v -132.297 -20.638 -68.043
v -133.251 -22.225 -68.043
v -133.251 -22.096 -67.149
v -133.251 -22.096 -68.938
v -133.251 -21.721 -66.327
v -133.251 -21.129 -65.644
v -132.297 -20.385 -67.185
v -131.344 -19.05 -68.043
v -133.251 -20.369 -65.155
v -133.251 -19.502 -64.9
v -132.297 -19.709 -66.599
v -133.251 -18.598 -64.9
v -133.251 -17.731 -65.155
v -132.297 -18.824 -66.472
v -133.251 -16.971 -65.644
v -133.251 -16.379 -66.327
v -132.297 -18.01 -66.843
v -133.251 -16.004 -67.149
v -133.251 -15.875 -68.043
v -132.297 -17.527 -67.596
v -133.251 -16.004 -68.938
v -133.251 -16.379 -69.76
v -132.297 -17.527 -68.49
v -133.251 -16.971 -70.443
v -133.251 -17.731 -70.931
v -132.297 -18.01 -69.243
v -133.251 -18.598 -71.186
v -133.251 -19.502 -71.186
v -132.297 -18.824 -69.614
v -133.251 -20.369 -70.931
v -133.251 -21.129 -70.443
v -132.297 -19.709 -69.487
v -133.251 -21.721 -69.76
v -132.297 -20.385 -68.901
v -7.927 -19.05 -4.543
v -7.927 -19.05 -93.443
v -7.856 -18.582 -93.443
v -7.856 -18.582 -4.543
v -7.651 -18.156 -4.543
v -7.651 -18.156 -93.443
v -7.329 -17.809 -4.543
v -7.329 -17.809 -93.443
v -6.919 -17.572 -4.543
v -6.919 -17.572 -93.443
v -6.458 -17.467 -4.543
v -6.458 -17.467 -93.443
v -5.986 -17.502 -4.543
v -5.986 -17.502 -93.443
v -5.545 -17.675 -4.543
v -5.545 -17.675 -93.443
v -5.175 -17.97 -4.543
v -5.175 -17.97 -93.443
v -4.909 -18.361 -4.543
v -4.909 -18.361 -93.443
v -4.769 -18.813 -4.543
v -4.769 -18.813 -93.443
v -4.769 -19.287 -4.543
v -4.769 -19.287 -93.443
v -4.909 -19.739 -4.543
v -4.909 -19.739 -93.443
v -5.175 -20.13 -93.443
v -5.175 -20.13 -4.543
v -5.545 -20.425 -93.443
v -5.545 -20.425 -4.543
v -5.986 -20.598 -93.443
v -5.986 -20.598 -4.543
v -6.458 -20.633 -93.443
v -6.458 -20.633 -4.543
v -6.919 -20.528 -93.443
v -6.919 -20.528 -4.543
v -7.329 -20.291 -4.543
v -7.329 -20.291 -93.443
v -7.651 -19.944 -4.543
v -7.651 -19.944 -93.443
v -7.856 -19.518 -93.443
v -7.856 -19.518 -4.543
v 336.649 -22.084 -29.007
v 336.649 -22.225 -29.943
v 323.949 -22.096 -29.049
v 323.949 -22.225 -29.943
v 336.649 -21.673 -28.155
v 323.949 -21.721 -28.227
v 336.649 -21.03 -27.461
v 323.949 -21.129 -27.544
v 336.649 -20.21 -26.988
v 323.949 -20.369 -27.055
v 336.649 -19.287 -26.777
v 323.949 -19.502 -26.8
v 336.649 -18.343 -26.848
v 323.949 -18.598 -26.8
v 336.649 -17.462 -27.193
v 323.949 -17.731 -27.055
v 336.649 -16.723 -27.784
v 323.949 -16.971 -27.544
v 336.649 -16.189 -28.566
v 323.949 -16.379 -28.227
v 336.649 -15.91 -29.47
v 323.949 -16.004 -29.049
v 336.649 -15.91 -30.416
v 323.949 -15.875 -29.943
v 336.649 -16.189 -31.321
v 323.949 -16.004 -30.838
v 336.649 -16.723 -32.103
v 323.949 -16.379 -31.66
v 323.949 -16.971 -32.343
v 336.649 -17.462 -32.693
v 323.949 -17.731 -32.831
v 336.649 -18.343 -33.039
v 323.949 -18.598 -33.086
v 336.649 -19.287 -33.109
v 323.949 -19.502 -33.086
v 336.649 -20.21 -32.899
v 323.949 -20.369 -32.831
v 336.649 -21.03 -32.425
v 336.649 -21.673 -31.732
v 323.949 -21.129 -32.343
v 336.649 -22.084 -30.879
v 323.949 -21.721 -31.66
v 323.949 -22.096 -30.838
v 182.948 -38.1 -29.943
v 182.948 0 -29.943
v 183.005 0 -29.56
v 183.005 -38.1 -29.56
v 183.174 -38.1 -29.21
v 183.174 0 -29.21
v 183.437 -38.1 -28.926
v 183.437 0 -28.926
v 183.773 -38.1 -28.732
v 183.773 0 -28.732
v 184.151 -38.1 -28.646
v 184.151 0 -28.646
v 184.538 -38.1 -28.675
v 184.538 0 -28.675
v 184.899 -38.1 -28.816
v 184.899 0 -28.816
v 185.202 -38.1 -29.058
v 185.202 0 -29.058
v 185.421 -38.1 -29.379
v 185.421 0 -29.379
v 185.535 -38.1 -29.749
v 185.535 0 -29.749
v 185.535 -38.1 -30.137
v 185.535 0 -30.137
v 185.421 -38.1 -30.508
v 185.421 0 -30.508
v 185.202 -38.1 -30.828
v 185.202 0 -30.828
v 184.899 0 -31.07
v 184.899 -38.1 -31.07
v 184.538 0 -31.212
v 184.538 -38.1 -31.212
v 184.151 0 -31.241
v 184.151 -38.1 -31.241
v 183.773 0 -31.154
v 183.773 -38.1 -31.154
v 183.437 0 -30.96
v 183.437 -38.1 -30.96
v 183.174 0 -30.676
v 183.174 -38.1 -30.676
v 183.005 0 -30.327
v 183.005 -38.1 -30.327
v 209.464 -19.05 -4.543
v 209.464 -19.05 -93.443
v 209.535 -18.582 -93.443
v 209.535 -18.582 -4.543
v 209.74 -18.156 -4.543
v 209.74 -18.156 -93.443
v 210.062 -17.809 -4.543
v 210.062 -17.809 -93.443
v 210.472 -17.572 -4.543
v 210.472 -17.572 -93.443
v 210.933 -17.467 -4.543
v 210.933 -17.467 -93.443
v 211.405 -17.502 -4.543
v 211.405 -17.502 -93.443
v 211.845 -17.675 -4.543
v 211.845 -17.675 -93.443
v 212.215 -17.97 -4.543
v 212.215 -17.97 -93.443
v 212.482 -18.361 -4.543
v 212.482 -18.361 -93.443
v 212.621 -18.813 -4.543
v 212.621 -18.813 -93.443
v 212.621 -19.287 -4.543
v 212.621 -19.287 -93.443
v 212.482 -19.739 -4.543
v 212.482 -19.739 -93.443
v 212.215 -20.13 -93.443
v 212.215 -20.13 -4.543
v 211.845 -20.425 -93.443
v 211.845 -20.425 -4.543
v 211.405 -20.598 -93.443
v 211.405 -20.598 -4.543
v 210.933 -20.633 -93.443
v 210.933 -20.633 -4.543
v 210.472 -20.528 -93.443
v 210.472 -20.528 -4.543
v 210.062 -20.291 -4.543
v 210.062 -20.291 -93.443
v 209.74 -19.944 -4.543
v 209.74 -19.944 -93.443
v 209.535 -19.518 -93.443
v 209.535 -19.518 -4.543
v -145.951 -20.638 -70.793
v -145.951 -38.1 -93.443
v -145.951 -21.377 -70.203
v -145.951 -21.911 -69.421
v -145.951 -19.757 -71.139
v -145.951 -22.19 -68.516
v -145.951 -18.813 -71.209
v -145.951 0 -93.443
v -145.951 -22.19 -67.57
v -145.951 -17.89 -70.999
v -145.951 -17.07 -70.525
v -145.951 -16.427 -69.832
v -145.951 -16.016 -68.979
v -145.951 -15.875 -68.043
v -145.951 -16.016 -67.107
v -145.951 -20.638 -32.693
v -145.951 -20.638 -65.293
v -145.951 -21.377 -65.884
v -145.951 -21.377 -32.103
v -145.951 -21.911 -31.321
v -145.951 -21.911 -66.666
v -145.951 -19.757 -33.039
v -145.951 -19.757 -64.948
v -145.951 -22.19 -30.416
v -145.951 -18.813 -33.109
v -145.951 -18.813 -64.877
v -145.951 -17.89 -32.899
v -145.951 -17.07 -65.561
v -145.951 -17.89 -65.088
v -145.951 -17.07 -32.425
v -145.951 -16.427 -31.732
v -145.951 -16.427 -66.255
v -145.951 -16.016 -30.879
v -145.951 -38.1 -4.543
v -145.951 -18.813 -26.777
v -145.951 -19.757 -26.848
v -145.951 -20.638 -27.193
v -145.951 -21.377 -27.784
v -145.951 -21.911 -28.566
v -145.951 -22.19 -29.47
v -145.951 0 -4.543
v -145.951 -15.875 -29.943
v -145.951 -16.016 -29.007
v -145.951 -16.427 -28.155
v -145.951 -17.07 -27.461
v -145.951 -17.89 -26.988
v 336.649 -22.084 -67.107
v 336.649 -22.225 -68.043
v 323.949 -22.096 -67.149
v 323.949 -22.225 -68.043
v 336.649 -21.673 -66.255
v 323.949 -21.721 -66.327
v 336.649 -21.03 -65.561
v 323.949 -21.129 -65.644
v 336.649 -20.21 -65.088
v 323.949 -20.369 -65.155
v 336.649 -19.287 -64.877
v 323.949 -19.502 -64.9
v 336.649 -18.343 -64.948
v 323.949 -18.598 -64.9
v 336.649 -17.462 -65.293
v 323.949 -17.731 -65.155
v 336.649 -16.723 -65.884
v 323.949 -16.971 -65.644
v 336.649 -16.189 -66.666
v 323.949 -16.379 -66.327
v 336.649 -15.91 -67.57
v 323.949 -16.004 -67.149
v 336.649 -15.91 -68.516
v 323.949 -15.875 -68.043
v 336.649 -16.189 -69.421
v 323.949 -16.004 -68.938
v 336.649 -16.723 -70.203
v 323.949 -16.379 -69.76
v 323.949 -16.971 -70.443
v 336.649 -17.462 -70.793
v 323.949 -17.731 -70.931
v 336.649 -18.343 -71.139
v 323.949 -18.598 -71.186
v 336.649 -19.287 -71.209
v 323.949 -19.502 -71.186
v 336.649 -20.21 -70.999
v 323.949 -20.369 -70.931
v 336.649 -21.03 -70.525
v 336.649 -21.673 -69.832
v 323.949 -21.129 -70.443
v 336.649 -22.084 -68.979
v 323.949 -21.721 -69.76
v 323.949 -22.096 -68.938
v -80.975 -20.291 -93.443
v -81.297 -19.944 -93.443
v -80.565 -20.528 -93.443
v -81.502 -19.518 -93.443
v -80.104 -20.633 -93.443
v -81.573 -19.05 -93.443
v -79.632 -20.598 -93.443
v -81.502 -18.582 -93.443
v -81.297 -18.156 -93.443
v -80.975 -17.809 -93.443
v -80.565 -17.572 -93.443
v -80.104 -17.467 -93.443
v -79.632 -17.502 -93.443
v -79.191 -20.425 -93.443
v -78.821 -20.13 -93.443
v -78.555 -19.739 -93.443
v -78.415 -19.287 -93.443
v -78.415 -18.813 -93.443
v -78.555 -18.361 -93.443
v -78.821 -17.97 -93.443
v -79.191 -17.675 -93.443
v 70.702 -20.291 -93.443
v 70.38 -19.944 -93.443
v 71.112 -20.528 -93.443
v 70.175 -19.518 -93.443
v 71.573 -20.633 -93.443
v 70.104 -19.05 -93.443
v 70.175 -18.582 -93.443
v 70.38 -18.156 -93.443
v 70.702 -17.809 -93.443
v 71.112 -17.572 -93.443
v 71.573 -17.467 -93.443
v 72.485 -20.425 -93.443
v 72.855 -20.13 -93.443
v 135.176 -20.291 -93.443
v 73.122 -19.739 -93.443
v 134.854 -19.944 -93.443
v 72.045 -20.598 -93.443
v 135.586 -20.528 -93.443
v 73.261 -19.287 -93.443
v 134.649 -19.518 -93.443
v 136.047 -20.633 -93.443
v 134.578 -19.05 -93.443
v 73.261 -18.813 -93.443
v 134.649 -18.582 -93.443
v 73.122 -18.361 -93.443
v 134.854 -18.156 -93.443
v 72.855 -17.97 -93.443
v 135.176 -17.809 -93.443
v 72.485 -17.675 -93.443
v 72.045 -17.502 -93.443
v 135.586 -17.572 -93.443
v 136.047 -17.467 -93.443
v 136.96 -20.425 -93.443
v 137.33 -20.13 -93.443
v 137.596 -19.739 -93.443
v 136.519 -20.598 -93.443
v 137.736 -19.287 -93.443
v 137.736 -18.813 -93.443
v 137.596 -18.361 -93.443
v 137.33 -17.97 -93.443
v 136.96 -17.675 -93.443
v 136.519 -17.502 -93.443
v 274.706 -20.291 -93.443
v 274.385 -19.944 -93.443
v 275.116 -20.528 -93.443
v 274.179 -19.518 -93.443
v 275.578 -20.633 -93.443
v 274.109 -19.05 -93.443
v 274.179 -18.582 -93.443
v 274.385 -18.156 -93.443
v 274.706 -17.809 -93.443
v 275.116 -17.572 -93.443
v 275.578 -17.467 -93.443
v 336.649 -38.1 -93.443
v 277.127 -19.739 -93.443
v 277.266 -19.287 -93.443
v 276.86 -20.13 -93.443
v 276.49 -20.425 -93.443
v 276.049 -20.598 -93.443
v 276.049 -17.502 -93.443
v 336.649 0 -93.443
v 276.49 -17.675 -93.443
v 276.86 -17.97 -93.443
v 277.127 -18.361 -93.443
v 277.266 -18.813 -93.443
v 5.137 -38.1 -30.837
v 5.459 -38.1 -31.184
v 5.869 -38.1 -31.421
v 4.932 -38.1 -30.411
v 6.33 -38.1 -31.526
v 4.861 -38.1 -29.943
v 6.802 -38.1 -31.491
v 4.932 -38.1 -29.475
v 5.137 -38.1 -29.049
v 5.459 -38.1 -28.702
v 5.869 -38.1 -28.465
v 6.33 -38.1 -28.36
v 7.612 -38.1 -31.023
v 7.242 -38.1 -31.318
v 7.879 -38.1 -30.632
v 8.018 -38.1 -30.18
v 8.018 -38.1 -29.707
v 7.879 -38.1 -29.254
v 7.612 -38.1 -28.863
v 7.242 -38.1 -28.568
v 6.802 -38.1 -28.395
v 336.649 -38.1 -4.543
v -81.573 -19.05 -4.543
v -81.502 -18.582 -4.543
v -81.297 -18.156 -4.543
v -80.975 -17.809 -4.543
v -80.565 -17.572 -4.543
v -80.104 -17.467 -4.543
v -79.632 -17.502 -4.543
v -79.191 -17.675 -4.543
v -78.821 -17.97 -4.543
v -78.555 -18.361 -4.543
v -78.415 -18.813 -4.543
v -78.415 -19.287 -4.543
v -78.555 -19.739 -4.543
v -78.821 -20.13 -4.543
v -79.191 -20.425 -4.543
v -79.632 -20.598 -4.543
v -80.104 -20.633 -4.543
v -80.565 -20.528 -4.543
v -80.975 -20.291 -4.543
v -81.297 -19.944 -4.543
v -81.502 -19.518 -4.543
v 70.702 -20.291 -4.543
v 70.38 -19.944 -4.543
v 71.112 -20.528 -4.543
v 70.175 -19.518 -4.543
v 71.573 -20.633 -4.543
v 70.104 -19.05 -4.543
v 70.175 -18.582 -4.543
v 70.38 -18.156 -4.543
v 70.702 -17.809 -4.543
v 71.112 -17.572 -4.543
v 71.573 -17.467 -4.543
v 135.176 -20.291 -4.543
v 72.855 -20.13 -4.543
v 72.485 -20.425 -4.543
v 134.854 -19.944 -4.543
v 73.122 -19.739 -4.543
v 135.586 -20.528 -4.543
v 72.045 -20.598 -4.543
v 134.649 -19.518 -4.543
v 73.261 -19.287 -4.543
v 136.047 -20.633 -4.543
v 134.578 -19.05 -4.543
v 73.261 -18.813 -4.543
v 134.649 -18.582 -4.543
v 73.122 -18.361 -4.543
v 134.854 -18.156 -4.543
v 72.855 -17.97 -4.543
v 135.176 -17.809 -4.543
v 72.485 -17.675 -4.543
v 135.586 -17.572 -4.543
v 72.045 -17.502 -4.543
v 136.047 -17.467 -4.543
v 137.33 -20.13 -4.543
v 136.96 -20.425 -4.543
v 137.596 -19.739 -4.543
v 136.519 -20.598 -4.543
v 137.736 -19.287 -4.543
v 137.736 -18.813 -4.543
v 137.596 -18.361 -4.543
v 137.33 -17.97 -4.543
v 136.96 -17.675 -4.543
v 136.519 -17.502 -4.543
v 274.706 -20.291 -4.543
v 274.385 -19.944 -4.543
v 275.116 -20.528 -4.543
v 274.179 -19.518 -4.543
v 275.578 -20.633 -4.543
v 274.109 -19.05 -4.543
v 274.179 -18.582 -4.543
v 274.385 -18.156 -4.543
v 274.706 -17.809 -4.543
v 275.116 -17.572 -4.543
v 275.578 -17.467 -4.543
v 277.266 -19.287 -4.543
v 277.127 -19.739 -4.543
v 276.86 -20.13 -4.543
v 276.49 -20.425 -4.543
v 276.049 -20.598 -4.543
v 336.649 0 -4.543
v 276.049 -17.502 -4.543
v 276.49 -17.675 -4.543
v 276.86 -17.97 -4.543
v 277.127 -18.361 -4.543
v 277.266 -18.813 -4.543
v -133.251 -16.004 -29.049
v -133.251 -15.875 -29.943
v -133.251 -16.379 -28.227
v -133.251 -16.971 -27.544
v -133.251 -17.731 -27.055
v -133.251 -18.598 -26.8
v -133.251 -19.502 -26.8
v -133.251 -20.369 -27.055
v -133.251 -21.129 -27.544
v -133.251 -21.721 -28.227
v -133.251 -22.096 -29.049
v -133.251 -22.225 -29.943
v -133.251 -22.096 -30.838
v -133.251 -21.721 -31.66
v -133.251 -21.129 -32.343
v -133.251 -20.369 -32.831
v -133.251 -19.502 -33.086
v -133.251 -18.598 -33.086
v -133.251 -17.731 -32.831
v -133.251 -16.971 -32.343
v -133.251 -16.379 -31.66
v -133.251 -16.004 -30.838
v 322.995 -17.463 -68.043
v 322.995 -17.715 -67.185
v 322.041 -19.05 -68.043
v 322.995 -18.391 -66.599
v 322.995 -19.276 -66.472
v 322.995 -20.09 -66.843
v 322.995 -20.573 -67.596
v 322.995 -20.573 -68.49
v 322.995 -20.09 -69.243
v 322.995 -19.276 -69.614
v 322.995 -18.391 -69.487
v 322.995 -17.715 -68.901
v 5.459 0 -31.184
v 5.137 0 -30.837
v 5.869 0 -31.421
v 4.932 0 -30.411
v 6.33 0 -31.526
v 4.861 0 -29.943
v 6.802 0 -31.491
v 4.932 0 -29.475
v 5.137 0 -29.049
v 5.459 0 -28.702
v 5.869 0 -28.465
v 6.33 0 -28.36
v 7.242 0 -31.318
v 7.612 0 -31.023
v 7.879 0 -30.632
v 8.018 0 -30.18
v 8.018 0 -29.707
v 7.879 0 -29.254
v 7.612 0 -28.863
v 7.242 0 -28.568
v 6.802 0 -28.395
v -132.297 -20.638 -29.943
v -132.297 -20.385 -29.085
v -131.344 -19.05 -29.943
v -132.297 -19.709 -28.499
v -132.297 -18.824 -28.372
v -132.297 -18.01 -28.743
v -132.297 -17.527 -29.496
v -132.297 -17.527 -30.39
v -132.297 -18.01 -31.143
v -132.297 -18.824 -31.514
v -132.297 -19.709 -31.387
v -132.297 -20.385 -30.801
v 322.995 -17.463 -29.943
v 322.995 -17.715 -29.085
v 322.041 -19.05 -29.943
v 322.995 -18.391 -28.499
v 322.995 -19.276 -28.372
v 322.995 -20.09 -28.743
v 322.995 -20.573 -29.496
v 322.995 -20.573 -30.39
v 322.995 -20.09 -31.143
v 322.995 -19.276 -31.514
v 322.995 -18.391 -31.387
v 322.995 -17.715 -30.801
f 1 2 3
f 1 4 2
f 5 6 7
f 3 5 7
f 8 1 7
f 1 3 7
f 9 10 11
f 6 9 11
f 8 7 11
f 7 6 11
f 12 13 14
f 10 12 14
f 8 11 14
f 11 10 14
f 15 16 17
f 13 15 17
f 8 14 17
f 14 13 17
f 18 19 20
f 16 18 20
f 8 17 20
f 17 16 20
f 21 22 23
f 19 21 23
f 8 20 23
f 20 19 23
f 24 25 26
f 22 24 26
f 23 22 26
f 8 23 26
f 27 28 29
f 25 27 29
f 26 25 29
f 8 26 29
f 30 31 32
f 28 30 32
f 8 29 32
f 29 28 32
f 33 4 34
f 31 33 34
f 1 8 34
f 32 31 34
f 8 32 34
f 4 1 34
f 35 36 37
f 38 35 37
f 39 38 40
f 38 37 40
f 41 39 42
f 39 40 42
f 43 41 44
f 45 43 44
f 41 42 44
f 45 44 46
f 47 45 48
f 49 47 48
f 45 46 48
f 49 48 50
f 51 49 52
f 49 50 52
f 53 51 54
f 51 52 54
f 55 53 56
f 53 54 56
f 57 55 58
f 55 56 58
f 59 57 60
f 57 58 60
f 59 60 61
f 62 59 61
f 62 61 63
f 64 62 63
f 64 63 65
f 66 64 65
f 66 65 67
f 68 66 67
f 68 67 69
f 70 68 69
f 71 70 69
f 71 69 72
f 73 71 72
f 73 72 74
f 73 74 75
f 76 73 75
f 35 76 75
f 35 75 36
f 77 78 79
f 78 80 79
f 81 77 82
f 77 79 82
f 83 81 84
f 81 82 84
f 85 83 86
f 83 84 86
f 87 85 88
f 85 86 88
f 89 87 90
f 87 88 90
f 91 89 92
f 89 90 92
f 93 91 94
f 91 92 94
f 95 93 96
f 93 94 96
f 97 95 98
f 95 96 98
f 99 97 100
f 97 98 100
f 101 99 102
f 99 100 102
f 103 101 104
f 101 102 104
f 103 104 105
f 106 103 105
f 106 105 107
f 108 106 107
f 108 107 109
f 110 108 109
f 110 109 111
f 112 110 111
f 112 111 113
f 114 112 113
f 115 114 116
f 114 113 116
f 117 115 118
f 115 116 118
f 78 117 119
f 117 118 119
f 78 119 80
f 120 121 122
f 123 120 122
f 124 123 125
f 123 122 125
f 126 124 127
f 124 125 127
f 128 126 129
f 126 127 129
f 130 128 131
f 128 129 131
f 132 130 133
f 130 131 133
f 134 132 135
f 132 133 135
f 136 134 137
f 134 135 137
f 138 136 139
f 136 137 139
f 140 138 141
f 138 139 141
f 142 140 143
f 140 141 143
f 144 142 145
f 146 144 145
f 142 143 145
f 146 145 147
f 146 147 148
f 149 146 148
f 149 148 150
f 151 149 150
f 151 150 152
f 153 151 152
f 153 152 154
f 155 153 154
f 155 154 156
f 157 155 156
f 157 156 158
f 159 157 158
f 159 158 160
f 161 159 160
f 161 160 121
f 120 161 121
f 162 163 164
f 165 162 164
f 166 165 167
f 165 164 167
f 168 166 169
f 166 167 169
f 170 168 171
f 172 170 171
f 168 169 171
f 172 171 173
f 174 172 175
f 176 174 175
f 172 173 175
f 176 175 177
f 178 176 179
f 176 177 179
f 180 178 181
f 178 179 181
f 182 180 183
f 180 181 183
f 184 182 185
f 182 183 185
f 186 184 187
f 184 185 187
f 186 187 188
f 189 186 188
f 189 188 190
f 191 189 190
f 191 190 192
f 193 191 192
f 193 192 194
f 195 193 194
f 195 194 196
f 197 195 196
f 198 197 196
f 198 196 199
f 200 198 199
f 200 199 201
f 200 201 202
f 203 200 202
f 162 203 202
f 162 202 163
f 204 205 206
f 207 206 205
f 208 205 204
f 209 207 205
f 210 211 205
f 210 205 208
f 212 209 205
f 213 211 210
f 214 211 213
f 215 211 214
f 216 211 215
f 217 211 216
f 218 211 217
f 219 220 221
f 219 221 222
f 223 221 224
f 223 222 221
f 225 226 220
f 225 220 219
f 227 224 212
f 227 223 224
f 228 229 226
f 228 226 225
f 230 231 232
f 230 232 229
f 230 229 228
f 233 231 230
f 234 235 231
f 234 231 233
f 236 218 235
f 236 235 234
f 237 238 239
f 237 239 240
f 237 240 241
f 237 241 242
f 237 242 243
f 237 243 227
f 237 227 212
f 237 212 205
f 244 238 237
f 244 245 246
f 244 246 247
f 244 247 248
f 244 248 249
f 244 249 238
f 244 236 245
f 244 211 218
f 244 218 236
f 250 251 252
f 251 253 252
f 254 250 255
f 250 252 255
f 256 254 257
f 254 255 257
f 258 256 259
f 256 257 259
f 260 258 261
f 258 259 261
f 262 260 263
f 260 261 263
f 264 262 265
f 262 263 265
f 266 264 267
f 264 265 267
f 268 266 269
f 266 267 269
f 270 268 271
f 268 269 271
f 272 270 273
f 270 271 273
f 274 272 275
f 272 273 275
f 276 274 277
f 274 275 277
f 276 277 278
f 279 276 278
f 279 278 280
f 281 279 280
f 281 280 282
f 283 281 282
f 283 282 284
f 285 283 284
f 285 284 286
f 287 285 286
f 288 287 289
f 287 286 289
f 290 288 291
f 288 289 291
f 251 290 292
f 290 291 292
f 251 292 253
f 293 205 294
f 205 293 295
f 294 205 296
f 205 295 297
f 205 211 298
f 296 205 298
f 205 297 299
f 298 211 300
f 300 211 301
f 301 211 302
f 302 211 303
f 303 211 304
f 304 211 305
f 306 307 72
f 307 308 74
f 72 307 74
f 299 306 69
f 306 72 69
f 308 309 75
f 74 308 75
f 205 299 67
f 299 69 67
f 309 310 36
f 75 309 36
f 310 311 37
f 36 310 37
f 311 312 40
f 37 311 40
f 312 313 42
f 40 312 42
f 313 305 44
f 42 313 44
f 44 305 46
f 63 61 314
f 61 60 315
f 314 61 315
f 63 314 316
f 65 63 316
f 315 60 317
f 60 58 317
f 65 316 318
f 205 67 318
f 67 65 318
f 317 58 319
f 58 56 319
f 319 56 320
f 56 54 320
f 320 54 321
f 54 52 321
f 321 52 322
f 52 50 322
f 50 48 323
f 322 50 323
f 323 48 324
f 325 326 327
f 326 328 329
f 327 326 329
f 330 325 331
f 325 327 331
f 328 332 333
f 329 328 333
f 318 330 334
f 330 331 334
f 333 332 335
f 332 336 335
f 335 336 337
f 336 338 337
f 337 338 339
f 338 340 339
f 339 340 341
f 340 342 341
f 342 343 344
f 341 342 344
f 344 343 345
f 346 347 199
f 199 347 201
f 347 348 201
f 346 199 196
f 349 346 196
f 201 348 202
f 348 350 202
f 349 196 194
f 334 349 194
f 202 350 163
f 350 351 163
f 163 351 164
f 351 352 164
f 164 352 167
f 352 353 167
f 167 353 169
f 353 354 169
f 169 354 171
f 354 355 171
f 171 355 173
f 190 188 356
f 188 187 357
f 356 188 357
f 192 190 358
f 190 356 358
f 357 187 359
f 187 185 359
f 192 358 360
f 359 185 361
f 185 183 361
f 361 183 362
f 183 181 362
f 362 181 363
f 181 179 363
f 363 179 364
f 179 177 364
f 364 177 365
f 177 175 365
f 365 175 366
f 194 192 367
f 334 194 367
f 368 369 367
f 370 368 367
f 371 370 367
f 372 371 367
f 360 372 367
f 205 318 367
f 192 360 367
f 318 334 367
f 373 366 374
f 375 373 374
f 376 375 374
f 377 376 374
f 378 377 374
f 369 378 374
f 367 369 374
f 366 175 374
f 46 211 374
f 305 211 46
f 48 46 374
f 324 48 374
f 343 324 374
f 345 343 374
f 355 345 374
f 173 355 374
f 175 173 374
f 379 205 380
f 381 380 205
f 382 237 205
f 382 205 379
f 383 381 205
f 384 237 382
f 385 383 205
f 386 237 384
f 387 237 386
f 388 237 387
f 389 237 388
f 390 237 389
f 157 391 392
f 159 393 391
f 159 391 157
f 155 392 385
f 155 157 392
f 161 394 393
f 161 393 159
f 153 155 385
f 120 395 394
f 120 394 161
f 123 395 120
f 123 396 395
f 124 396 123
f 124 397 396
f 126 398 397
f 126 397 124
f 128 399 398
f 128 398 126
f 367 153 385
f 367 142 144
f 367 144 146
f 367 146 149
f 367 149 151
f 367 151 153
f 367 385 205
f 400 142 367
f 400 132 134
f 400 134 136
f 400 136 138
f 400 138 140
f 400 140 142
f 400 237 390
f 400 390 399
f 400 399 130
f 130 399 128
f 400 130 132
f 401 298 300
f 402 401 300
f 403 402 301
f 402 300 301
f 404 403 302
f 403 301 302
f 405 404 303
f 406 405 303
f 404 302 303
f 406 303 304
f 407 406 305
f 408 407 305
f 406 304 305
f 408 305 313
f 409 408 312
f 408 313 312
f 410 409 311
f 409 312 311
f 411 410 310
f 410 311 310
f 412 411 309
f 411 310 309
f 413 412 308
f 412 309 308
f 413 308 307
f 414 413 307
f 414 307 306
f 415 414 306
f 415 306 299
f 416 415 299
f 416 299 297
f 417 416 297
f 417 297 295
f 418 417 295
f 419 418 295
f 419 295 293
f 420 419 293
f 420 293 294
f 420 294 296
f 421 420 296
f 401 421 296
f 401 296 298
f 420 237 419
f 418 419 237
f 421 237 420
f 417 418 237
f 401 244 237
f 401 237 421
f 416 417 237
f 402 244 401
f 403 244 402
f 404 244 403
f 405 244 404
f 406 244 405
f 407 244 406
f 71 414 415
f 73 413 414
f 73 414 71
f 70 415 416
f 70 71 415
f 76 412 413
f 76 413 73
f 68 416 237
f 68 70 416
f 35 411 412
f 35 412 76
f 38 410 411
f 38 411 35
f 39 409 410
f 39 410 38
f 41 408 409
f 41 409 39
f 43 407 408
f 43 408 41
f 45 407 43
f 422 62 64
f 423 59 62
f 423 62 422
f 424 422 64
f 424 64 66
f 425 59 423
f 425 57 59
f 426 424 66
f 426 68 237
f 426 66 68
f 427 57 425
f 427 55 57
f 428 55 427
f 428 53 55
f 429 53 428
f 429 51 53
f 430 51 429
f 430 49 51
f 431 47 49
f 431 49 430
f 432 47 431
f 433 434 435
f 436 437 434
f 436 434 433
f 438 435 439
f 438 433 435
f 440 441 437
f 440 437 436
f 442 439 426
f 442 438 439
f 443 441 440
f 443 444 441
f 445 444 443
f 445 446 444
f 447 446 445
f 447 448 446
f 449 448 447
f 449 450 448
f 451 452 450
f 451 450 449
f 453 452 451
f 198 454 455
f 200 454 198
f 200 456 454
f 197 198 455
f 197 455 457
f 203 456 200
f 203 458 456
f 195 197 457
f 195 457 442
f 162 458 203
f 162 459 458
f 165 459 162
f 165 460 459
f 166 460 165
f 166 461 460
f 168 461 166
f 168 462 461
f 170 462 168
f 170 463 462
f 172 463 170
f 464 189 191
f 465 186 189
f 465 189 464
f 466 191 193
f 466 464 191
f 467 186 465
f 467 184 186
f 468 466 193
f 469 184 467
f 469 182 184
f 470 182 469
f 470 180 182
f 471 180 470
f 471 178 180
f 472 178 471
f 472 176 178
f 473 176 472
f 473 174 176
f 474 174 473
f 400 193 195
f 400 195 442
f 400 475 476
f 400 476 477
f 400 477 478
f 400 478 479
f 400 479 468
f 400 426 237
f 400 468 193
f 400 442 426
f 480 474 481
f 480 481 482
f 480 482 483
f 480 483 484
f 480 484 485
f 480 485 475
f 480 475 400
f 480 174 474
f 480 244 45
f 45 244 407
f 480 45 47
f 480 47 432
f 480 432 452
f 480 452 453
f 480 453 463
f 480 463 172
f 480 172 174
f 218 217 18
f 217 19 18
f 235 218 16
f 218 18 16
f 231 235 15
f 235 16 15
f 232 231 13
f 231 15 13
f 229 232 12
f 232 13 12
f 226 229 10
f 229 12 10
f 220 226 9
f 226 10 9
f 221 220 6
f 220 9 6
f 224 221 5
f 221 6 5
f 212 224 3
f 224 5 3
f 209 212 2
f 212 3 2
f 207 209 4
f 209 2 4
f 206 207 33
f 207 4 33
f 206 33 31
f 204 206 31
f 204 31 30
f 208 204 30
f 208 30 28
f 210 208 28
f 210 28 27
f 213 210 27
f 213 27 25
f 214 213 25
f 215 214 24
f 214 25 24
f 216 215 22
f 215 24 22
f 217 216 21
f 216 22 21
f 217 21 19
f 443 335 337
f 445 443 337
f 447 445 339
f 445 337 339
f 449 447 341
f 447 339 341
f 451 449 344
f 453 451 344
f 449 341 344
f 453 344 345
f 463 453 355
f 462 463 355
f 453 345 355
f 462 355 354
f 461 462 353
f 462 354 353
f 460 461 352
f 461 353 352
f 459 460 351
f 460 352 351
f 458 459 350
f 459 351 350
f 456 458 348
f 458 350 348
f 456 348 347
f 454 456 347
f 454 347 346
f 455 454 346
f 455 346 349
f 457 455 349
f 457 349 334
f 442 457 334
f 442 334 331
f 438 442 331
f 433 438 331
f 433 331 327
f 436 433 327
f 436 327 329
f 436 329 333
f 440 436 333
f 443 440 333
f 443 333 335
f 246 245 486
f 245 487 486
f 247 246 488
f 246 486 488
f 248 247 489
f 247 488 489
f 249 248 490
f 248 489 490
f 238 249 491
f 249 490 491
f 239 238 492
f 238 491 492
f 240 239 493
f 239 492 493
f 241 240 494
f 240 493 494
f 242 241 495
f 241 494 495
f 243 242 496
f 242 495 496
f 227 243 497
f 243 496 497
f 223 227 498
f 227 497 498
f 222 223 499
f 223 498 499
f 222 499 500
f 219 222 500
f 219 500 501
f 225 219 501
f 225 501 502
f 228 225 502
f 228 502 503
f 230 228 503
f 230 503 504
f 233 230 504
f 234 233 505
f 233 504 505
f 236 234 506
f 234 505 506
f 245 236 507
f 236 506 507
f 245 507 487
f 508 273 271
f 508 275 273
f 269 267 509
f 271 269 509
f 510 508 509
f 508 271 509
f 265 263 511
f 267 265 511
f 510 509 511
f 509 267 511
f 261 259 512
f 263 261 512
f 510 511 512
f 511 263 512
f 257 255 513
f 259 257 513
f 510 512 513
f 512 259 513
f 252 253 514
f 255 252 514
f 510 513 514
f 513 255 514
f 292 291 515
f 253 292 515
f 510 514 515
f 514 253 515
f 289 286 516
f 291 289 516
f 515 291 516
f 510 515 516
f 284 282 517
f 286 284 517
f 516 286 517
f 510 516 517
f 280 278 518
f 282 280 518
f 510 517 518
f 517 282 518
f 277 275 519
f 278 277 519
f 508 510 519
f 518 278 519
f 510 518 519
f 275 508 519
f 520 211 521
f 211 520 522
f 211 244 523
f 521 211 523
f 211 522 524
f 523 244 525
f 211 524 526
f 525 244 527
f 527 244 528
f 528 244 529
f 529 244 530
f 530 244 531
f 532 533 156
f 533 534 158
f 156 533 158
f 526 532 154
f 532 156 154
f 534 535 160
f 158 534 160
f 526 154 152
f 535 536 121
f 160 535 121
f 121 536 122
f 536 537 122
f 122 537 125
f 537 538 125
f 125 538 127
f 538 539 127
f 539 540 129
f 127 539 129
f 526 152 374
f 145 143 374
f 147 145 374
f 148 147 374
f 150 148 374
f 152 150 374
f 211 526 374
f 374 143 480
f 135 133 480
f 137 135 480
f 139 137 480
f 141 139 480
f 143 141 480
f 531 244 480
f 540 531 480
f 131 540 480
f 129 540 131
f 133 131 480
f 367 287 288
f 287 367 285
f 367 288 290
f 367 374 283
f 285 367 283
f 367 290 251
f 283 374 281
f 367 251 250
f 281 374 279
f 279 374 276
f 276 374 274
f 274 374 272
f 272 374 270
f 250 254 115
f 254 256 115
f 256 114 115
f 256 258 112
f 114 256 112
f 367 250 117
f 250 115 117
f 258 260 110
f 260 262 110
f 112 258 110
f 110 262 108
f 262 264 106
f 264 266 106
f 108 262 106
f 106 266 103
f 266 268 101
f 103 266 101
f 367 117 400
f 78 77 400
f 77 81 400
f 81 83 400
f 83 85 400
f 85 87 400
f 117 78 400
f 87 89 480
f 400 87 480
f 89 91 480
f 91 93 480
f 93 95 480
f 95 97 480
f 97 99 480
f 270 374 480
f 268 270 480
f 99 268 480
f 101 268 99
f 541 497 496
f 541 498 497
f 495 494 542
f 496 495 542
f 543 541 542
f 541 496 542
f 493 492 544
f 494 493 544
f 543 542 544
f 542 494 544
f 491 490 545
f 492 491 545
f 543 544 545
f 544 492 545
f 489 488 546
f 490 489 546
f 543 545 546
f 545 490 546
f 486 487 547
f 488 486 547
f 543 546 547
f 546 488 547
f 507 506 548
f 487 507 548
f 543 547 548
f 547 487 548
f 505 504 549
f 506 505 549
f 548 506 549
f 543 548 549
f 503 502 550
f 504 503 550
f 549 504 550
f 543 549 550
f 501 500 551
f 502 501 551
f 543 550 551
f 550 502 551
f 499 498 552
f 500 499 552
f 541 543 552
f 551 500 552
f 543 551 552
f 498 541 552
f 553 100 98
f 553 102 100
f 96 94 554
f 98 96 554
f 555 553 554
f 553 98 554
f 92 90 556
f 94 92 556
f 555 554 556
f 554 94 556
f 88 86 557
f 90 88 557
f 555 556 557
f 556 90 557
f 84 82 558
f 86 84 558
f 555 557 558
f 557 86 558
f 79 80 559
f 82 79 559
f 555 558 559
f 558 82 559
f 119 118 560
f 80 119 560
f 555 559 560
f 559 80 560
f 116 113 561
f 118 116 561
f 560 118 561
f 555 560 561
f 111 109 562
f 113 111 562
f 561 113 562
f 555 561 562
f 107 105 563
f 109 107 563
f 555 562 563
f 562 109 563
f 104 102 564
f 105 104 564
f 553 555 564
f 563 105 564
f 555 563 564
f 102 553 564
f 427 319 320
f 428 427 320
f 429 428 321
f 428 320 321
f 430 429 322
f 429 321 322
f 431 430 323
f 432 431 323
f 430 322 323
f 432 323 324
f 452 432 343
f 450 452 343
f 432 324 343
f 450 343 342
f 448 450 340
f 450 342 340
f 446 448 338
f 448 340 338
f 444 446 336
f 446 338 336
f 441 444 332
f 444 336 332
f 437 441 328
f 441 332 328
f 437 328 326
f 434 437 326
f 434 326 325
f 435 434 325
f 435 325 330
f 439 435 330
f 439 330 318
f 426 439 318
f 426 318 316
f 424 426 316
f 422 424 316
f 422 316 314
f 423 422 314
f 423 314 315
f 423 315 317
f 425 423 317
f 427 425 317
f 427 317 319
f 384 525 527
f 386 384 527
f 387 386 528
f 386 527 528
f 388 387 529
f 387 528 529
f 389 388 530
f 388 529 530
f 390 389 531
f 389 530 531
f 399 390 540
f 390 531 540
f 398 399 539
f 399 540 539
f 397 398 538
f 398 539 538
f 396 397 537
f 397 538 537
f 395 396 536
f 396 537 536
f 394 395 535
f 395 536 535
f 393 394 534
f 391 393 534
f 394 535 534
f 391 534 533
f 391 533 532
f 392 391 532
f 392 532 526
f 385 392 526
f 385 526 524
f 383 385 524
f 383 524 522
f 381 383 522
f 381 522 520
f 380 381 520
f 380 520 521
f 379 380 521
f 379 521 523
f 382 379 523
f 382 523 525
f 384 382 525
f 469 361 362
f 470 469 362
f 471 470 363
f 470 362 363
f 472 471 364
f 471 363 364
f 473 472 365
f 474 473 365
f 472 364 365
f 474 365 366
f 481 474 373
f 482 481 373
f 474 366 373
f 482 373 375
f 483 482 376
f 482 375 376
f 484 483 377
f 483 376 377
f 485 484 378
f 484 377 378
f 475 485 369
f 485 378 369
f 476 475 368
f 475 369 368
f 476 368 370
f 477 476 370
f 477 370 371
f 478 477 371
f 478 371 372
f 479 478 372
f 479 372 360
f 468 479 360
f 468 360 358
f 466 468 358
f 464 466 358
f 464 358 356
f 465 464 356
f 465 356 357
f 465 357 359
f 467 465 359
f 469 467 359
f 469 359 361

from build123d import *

# Parameters (mm, degrees)
F0_W     = 482.6
F0_H     = 88.9
F1_DEPTH = 38.1
F3_D     = 6.35
F3_DEPTH = 12.7
F3_TIP   = 1.9077324654
F5_D     = 6.35
F5_DEPTH = 12.7
F5_TIP   = 1.9077324654
F6_R     = 1.3011245906
F6_R_2   = 1.5875
F7_DEPTH = 38.101
F9_D     = 3.175


with BuildPart() as f1:
    # F0 (on Front) → F1 (new body)
    with BuildSketch(Plane.XZ):
        with Locations((95.348703318, -48.9931209013)):
            Rectangle(F0_W, F0_H)
    extrude(amount=F1_DEPTH)

    # F3
    with Locations(Plane.YZ.offset(336.648703318)):
        with Locations((-19.05, -29.9431209013), (-19.05, -68.0431209013)):
            Hole(F3_D / 2, depth=F3_DEPTH)
            with Locations((0, 0, -(F3_DEPTH + F3_TIP / 2))):  # 118° drill point
                Cone(0, F3_D / 2, F3_TIP, mode=Mode.SUBTRACT)

    # F5
    with Locations(Plane(origin=(-145.951296682, 0, 0), x_dir=(0, -1, 0), z_dir=(-1, 0, 0))):
        with Locations((19.05, -29.9431209013), (19.05, -68.0431209013)):
            Hole(F5_D / 2, depth=F5_DEPTH)
            with Locations((0, 0, -(F5_DEPTH + F5_TIP / 2))):  # 118° drill point
                Cone(0, F5_D / 2, F5_TIP, mode=Mode.SUBTRACT)

    # F6 (on face) → F7 (cut, through all)
    with BuildSketch(Plane(origin=(0, 0, 0), x_dir=(-1, 0, 0), z_dir=(0, 1, 0))):
        with Locations((-184.248703318, -29.9431209013)):
            Circle(F6_R)
        with Locations((-6.448703318, -29.9431209013)):
            Circle(F6_R_2)
    extrude(amount=-F7_DEPTH, mode=Mode.SUBTRACT)

    # F9 (through all)
    with Locations(Plane.XY.offset(-4.5431209013)):
        with Locations((275.6962180138, -19.05), (211.0514938831, -19.05), (136.1659169197, -19.05), (71.6916397214, -19.05), (-6.3390433788, -19.05), (-79.9852013588, -19.05)):
            Hole(F9_D / 2)


solid = f1.part
